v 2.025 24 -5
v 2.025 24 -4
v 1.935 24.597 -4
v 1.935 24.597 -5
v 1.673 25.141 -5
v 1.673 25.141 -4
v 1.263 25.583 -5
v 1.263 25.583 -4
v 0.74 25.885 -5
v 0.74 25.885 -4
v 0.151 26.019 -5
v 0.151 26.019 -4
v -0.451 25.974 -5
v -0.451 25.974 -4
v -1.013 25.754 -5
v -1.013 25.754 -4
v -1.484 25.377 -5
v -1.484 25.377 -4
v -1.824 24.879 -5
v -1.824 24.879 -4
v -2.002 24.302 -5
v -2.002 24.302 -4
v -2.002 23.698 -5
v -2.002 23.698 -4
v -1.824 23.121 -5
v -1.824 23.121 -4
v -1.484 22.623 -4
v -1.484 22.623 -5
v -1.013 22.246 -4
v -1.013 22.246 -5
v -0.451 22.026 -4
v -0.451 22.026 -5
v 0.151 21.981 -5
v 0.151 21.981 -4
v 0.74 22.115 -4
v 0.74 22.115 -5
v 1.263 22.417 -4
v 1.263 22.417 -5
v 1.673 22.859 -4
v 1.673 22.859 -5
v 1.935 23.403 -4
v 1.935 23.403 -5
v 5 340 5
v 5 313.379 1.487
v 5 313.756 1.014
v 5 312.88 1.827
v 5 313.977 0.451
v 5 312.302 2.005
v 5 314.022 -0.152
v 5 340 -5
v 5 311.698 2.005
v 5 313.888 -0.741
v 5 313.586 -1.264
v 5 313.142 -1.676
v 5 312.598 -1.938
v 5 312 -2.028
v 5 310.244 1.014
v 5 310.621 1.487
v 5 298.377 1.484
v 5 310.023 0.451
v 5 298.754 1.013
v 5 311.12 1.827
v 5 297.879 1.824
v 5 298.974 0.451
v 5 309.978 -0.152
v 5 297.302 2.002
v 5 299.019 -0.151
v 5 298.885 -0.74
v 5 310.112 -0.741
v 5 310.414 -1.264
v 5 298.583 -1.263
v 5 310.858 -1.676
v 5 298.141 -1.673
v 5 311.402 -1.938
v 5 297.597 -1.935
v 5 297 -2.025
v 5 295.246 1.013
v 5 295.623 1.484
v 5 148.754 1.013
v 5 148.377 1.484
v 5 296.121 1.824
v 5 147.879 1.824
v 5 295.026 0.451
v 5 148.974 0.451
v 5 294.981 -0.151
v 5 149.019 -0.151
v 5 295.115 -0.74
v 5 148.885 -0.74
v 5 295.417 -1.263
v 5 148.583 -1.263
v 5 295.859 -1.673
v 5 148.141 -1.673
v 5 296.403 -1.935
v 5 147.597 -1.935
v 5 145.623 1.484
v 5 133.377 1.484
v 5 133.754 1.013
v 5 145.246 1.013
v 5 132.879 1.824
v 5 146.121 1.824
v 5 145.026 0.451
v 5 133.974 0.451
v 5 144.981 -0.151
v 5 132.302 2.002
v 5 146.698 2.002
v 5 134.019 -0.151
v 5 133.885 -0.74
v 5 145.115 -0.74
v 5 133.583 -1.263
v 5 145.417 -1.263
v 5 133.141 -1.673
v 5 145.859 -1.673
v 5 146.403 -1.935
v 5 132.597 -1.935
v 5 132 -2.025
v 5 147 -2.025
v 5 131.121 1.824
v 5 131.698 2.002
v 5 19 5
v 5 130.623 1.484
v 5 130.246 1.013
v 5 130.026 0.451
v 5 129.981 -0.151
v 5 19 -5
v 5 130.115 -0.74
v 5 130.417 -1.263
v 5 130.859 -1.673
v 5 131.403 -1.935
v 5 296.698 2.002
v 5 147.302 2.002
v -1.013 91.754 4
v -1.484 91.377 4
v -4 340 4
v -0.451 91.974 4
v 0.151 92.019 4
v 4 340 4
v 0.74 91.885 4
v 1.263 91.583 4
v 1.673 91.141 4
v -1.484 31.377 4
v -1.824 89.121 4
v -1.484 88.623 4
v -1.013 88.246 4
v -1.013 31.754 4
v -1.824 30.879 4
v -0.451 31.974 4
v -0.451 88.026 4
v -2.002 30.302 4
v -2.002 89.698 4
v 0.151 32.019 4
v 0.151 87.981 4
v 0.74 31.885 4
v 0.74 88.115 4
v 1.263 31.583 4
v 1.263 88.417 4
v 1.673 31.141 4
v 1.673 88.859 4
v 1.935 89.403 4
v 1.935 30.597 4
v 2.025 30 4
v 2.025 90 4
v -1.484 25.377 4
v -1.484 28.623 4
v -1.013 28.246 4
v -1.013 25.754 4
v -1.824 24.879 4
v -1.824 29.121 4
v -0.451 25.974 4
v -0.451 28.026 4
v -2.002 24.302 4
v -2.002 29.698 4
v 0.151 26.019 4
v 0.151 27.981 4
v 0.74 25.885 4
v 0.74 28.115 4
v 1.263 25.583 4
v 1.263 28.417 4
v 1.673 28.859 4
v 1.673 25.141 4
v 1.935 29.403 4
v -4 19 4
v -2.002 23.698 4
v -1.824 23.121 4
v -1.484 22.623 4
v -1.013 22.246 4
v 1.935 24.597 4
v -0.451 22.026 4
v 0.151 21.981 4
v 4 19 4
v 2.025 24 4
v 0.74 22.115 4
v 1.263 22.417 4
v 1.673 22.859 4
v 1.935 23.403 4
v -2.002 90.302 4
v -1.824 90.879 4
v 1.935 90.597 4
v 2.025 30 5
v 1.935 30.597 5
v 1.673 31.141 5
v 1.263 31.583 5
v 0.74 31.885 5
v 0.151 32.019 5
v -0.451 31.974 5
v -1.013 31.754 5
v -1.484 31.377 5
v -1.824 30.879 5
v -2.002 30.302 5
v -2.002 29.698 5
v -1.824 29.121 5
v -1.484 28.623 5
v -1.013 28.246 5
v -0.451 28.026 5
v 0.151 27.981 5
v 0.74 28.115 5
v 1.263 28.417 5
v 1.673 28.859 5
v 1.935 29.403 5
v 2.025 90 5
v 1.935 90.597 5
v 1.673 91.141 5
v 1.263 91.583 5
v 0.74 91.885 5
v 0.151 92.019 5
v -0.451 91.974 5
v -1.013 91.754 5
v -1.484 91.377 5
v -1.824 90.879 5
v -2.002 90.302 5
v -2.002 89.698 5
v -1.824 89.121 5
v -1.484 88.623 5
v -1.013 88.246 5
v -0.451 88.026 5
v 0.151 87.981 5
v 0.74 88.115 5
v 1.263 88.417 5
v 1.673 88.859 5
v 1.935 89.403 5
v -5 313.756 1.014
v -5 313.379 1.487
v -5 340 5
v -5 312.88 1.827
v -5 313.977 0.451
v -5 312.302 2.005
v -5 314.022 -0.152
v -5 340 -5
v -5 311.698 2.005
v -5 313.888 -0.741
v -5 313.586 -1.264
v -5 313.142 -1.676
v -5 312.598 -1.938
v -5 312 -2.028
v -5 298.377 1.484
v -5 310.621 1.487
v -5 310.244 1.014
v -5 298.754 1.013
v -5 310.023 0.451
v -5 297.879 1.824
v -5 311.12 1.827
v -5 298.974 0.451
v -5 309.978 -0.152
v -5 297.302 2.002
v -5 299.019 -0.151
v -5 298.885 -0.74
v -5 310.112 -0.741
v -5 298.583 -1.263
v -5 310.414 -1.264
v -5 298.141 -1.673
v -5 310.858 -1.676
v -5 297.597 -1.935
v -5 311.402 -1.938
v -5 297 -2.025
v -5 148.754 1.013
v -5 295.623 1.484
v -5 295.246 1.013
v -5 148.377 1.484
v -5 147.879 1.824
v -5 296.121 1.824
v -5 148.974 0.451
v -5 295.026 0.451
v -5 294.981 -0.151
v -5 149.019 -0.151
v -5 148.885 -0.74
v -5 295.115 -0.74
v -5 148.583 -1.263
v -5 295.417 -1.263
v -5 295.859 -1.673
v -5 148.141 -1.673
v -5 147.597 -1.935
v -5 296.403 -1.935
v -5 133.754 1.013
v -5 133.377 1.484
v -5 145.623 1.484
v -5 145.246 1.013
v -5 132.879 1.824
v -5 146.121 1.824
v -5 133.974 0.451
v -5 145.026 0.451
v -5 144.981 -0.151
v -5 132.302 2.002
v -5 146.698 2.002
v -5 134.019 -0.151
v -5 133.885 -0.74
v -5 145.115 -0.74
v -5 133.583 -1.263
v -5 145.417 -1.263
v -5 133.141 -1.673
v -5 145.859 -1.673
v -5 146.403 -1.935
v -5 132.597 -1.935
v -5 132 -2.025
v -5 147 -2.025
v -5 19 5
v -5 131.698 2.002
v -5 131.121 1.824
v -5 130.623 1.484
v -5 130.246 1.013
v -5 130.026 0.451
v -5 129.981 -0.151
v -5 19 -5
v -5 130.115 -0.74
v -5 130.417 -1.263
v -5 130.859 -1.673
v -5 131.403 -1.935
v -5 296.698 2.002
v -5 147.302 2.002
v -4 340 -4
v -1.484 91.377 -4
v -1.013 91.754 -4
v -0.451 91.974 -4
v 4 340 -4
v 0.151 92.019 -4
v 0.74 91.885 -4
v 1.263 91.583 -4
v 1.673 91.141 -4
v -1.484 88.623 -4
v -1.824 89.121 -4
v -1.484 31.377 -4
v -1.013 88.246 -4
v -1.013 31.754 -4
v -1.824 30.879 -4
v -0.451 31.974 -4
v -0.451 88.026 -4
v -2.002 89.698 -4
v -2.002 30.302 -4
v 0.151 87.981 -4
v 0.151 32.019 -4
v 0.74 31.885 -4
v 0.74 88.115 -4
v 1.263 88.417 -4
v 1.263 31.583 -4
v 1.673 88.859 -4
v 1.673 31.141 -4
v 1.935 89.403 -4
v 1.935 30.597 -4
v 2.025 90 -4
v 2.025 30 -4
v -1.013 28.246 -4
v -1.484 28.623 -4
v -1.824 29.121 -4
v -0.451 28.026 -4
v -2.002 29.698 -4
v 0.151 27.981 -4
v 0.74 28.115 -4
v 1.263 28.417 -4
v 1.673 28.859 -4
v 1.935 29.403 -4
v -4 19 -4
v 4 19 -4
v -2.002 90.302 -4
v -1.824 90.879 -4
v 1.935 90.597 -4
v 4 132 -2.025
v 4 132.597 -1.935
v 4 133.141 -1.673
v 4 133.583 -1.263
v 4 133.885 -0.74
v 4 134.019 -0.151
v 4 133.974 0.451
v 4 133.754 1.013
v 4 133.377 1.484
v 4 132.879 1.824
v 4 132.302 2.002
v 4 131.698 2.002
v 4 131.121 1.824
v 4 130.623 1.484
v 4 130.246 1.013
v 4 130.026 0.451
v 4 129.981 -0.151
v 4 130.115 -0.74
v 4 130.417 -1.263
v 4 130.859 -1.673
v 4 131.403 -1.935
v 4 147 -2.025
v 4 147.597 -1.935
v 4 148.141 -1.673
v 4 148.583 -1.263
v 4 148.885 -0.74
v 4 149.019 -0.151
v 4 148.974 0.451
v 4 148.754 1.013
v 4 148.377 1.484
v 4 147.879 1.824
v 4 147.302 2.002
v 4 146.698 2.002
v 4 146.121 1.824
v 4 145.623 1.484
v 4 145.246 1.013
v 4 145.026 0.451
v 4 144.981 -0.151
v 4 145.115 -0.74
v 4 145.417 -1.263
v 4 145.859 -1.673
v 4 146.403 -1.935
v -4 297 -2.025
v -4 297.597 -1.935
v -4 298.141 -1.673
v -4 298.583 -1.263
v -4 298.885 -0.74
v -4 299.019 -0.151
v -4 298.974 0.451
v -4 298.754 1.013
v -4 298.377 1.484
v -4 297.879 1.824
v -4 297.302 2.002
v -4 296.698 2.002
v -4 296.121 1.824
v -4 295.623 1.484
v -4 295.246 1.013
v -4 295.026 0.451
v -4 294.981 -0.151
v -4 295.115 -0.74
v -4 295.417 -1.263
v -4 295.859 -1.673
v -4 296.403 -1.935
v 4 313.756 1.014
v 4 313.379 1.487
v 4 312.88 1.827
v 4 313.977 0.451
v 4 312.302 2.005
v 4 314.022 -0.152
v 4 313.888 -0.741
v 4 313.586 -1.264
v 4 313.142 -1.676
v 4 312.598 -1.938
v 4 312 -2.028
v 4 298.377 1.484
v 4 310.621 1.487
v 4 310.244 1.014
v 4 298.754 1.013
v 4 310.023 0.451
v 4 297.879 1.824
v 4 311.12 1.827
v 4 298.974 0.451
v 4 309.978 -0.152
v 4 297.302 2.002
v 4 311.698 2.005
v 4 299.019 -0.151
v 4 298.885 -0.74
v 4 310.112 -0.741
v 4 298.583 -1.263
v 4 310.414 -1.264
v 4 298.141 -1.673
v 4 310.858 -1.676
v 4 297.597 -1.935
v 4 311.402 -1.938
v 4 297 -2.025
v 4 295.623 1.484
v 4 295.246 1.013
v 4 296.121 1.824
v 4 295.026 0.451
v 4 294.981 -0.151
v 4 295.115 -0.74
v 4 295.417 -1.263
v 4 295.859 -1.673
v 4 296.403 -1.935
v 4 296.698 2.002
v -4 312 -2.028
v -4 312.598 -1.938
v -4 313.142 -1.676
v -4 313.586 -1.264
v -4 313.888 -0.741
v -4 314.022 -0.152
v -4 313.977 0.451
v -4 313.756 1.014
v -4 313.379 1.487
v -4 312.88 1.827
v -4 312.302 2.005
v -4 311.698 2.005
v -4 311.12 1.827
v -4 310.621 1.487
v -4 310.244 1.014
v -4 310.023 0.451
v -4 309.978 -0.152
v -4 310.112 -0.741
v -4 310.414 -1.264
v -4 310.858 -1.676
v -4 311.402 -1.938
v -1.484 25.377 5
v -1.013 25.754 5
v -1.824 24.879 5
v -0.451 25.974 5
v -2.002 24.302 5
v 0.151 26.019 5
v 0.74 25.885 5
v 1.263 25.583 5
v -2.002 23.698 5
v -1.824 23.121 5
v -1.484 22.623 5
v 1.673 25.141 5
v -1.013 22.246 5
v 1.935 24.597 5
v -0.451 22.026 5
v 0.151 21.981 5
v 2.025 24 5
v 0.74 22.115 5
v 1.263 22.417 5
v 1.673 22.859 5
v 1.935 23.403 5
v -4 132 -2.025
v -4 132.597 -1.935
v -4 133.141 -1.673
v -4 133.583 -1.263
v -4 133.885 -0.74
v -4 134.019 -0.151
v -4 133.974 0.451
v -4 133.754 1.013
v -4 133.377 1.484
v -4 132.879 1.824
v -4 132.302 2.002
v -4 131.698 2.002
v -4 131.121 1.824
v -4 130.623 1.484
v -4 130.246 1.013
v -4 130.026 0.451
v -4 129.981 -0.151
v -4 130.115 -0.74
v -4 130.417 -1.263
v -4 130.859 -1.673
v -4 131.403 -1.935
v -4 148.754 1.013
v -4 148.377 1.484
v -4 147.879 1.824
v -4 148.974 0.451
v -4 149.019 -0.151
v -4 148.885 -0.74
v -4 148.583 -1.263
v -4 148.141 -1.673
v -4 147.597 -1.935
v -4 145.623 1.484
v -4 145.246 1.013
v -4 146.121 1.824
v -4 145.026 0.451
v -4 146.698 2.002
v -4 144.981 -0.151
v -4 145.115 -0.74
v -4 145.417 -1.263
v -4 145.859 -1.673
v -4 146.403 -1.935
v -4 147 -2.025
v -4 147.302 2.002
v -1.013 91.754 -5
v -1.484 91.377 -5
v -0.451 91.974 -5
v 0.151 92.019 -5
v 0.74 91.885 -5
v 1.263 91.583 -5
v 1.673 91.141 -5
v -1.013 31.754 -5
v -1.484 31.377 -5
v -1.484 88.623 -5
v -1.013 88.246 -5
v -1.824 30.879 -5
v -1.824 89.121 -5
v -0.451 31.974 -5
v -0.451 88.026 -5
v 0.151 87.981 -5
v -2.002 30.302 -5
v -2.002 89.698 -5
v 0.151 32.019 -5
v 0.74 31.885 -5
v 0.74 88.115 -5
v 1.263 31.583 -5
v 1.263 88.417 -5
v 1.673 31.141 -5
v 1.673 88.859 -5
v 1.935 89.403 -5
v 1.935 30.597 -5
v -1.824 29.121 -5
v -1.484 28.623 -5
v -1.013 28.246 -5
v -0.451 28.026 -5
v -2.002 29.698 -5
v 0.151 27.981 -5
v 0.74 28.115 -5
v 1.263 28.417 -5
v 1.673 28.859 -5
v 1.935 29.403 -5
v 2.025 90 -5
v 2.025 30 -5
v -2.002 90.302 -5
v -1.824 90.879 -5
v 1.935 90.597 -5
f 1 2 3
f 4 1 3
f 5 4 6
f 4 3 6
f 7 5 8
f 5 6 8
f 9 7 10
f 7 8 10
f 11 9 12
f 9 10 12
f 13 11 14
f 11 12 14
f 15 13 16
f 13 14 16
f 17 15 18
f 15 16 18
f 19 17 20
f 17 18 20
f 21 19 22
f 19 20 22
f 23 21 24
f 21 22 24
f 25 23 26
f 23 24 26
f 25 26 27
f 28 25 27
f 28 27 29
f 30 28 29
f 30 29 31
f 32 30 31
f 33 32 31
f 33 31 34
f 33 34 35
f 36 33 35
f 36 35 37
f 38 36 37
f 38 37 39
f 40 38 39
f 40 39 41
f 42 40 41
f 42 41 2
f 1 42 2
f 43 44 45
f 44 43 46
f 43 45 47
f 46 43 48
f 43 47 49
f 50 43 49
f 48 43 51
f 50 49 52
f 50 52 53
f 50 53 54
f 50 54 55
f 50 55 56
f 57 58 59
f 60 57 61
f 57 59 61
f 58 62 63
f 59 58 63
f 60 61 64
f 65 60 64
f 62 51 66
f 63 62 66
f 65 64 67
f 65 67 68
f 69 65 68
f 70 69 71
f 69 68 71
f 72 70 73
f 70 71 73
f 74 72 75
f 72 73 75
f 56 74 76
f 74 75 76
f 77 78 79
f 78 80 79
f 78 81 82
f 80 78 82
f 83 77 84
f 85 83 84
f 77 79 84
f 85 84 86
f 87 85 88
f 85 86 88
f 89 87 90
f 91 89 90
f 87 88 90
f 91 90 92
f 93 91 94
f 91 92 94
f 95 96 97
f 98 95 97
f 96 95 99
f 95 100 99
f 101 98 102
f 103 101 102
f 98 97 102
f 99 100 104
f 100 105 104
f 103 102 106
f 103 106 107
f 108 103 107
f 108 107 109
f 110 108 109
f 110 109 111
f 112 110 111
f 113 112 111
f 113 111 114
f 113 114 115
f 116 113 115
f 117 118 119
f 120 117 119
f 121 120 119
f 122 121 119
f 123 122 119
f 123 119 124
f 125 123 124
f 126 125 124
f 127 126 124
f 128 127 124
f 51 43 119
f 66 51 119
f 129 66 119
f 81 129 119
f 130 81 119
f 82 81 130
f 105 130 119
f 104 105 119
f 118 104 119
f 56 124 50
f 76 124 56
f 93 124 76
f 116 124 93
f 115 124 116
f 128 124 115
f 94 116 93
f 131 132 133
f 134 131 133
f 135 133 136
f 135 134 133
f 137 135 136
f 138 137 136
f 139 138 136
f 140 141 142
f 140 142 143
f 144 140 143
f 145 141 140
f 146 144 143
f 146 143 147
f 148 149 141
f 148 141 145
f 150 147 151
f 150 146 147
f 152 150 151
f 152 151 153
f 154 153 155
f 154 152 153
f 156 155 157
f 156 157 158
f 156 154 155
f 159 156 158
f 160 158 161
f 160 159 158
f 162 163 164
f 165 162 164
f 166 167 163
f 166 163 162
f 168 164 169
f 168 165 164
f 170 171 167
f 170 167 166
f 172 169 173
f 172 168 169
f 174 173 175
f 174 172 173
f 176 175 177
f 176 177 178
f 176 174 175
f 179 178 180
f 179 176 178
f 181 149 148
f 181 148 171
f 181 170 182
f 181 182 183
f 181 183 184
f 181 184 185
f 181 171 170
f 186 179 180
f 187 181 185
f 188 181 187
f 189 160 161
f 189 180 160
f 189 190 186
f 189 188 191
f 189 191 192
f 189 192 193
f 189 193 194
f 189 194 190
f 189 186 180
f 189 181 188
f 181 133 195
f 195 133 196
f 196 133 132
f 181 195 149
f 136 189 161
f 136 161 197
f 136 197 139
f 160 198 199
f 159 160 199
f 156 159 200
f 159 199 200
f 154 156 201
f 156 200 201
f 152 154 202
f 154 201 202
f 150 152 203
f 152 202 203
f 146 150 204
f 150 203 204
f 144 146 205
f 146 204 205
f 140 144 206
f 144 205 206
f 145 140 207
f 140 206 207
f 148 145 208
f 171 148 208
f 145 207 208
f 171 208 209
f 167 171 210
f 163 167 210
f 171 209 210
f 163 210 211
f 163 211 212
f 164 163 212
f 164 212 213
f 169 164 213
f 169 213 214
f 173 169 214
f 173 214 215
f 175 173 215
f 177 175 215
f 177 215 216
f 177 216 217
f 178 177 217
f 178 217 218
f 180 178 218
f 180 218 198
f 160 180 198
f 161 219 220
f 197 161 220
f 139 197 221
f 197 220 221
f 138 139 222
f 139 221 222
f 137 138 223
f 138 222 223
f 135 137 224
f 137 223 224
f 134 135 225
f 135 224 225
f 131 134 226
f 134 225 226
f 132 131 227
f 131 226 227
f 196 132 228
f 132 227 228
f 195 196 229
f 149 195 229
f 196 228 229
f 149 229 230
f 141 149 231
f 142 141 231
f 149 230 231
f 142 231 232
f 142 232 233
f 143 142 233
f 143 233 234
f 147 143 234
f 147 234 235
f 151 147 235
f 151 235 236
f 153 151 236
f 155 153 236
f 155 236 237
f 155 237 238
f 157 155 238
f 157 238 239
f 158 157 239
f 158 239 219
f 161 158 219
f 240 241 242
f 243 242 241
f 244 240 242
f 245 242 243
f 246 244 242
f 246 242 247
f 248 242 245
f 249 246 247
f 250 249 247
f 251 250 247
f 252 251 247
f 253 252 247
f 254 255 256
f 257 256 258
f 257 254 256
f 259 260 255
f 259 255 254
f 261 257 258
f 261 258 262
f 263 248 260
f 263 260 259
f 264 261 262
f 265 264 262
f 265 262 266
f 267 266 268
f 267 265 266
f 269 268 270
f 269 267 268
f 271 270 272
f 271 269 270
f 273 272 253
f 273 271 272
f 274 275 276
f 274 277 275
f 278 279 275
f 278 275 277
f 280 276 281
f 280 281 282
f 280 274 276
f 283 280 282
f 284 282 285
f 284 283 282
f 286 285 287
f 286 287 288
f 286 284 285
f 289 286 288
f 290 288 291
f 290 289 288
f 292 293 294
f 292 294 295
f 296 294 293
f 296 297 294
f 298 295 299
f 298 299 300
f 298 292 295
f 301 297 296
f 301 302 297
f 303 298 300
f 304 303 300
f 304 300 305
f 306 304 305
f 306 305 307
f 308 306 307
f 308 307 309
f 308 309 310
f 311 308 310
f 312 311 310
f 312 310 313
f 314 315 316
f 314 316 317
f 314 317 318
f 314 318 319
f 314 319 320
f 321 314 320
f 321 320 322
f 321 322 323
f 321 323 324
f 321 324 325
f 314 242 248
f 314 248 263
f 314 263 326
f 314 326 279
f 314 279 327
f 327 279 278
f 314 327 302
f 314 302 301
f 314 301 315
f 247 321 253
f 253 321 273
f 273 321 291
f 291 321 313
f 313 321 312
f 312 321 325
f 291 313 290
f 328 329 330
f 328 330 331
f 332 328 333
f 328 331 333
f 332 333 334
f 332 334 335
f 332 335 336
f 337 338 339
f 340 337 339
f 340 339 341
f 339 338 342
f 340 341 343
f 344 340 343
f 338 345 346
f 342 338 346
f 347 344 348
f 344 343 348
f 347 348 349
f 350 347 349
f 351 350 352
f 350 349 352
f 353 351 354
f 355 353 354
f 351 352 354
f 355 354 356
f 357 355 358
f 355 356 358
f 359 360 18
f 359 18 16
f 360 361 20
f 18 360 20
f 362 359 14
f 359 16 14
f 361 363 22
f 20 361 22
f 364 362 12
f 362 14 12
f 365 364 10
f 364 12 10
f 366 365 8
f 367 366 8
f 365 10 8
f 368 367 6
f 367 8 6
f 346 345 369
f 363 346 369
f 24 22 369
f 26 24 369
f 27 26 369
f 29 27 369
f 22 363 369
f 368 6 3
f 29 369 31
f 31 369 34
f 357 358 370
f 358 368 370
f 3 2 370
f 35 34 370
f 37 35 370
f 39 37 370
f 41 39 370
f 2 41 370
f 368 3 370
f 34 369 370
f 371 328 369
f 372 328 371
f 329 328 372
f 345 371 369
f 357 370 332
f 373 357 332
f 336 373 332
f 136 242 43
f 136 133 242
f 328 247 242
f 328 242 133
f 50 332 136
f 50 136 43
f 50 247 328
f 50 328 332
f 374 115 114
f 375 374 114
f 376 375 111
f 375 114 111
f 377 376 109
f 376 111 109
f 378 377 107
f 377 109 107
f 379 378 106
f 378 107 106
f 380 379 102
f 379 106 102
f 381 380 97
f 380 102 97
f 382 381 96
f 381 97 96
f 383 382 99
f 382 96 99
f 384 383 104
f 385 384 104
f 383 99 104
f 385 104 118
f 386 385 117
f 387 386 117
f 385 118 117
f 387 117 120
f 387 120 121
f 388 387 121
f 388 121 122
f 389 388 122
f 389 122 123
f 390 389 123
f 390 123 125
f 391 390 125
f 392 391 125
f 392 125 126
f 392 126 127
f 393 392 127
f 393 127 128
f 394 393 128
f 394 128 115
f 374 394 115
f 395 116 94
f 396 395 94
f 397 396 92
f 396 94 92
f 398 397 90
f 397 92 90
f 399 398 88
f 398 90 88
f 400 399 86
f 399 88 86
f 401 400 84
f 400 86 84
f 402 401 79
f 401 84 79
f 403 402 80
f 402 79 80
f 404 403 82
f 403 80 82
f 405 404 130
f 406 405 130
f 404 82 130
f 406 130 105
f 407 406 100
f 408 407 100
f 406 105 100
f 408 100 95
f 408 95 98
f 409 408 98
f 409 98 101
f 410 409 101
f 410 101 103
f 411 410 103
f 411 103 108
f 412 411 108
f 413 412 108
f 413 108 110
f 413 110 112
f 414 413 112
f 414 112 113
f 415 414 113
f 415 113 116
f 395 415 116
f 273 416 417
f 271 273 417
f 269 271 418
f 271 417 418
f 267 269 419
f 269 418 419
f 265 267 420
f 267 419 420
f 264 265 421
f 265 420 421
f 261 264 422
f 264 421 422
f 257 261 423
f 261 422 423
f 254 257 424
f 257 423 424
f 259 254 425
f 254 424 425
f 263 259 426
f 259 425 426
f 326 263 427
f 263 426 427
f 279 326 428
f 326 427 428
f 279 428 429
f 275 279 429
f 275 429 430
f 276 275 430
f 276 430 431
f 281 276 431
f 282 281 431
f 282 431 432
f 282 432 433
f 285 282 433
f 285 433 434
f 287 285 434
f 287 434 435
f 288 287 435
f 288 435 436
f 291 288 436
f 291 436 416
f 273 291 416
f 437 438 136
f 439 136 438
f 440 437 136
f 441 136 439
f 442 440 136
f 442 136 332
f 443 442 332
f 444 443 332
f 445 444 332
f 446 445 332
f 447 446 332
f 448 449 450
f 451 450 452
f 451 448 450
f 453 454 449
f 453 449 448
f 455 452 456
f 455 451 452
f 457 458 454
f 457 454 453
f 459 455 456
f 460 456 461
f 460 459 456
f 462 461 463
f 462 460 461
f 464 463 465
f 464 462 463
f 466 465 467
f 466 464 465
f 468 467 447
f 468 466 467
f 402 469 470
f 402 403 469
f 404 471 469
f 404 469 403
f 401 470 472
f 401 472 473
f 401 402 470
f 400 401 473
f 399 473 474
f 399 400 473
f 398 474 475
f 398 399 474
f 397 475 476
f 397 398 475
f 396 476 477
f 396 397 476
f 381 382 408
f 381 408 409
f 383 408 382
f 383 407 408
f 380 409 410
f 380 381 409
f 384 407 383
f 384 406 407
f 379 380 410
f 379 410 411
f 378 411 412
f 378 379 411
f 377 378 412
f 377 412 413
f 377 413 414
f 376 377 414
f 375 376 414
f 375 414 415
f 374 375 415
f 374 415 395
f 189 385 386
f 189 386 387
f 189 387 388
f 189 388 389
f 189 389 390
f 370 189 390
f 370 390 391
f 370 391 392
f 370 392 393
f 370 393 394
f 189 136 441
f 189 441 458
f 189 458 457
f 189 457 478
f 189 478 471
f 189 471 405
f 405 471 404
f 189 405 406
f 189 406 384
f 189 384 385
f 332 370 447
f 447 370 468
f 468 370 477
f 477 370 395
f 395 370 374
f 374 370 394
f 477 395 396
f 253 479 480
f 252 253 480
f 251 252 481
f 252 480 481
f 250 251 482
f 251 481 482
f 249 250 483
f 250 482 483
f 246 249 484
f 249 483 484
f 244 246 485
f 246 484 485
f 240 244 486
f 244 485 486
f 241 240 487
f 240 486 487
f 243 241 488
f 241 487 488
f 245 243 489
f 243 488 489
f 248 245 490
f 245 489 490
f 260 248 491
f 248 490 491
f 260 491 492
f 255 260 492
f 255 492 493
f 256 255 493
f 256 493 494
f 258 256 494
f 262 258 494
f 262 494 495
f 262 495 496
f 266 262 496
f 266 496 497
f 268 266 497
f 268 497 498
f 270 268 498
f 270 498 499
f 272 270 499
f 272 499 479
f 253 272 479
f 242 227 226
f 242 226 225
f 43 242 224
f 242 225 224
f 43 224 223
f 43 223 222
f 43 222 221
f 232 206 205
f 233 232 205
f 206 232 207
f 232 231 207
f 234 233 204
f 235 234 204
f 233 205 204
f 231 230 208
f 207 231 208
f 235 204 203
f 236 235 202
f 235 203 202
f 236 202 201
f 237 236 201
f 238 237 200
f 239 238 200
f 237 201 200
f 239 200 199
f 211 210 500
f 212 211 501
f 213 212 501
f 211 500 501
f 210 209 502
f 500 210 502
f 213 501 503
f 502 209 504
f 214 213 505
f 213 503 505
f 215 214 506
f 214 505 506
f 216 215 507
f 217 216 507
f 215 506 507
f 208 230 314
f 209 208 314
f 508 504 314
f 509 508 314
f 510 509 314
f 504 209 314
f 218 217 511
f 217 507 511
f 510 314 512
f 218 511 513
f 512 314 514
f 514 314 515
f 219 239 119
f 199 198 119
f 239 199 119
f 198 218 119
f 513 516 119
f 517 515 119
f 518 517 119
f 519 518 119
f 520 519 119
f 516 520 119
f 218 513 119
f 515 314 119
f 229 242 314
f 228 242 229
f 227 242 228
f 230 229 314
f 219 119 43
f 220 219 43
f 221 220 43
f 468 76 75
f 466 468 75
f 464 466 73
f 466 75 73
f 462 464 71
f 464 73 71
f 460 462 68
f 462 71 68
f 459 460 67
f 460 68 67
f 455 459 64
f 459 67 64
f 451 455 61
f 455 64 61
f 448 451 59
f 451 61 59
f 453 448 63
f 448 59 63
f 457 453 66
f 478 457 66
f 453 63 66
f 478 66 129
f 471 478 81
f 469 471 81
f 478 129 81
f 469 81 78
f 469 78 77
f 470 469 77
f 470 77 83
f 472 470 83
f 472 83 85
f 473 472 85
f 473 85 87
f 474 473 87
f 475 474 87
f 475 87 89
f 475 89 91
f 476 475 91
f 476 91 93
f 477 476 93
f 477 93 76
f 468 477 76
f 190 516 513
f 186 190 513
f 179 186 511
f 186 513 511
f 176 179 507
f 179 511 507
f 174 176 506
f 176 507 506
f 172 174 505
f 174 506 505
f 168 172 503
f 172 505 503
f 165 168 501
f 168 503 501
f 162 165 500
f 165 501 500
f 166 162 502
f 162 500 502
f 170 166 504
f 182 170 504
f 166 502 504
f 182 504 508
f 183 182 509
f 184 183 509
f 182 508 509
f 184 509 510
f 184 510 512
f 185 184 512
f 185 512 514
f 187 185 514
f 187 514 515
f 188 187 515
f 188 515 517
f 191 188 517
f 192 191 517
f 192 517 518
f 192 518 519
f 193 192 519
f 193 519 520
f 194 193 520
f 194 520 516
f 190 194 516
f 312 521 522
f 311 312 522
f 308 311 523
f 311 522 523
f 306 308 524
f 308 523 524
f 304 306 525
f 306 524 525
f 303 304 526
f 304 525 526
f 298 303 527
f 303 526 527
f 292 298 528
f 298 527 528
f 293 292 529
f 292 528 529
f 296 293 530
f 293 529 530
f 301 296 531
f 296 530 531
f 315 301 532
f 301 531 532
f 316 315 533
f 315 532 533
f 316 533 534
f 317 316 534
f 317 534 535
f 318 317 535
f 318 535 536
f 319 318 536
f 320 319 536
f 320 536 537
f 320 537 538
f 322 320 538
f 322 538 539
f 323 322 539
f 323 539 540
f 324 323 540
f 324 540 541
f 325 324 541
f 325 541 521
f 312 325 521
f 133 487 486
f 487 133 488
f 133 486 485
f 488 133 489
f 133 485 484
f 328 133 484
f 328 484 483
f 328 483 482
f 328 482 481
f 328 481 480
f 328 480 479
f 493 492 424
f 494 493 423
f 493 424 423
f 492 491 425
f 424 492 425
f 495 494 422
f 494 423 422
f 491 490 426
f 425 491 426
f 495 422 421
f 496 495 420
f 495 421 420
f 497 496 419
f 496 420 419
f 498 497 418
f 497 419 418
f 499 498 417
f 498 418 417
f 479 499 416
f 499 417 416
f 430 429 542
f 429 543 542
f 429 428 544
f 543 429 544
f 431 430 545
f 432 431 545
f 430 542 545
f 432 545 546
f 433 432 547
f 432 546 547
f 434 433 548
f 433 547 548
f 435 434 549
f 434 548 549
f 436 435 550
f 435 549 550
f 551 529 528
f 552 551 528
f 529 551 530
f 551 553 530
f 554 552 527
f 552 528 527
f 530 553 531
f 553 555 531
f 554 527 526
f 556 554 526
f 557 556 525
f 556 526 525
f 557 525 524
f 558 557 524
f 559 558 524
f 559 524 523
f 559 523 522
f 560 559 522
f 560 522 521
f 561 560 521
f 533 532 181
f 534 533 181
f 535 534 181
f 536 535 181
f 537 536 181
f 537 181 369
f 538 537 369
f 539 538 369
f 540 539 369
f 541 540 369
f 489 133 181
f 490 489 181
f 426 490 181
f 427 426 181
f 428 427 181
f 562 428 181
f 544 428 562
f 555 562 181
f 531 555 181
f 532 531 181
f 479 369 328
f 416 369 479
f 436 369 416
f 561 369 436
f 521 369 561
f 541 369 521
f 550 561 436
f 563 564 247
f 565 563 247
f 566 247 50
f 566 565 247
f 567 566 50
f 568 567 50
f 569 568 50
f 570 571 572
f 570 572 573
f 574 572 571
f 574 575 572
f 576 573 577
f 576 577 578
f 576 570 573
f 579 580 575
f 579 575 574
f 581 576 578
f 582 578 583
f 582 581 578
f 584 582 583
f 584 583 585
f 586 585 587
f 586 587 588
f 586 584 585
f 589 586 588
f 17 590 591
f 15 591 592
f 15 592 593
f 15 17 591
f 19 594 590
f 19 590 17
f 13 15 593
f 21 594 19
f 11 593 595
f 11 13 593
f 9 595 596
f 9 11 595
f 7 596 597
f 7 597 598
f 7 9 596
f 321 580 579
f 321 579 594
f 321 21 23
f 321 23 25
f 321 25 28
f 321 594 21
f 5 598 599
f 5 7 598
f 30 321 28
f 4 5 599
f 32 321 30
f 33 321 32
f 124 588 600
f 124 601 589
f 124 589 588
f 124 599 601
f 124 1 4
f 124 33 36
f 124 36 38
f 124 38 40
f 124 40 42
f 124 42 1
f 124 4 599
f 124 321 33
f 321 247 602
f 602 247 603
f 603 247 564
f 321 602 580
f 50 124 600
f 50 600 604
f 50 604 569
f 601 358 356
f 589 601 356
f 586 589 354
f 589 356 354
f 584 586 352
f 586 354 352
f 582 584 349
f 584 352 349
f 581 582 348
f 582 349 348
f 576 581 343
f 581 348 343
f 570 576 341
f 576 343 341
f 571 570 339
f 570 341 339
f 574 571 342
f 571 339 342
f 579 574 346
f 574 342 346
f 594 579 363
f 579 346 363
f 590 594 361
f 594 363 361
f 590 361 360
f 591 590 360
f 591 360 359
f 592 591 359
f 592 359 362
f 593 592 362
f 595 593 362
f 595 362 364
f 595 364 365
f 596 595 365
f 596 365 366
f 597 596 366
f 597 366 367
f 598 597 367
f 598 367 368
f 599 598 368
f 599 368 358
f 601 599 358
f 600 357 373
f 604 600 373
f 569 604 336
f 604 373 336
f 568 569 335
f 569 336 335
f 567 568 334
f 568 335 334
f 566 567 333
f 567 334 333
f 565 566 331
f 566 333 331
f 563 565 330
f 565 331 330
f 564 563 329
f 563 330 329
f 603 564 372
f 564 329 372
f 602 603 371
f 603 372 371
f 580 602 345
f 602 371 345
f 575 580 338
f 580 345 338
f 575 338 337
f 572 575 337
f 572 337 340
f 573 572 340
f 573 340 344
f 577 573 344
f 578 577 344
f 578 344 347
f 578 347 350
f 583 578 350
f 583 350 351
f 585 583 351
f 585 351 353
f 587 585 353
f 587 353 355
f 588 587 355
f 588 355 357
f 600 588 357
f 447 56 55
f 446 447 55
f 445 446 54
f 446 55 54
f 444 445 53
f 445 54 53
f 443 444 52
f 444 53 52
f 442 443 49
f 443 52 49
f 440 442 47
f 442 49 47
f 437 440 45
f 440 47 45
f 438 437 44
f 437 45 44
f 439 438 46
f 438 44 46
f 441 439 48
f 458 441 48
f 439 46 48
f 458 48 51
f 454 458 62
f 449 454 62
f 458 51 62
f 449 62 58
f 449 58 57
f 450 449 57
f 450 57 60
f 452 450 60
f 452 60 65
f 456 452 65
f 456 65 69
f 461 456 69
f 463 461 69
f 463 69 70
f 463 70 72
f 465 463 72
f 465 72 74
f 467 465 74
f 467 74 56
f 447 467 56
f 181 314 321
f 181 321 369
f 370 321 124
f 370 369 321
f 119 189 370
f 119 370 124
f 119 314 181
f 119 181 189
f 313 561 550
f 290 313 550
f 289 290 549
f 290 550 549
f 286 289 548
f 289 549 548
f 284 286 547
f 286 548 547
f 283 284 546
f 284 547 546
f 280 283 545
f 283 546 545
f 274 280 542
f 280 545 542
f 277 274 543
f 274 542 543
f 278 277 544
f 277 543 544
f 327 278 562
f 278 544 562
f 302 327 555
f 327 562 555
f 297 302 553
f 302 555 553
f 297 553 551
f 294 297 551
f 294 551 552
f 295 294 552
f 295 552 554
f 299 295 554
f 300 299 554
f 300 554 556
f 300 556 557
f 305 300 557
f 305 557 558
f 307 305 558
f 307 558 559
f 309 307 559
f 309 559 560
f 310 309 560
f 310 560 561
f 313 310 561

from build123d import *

# Parameters (mm, degrees)
SKETCH1_W           = 10
SKETCH1_H           = 10
SKETCH1_W_2         = 8
SKETCH1_H_2         = 8
BOSS_EXTRUDE1_DEPTH = 340
SKETCH2_R           = 2.025
CUT_EXTRUDE1_DEPTH  = 341.183773863
SKETCH3_R           = 2.028
SKETCH3_R_2         = 2.025
CUT_EXTRUDE2_DEPTH  = 341.183773863
SKETCH4_W           = 10
SKETCH4_H           = 19
CUT_EXTRUDE3_DEPTH  = 341.183773863


with BuildPart() as part:
    # Sketch1 → Boss-Extrude1 (new body)
    with BuildSketch(Plane(origin=(0, 0, 0), x_dir=(1, 0, 0), z_dir=(0, 1, 0))):
        Rectangle(SKETCH1_W, SKETCH1_H)
        Rectangle(SKETCH1_W_2, SKETCH1_H_2, mode=Mode.SUBTRACT)
    extrude(amount=BOSS_EXTRUDE1_DEPTH)

    # Sketch2 → Cut-Extrude1 (cut, through all)
    with BuildSketch(Plane.XY.offset(5)):
        with Locations((0, 90)):
            Circle(SKETCH2_R)
        with Locations((0, 30)):
            Circle(SKETCH2_R)
        with Locations((0, 24)):
            Circle(SKETCH2_R)
    extrude(amount=-CUT_EXTRUDE1_DEPTH, mode=Mode.SUBTRACT)

    # Sketch3 → Cut-Extrude2 (cut, through all)
    with BuildSketch(Plane(origin=(5, 0, 0), x_dir=(0, 0, -1), z_dir=(1, 0, 0))):
        with Locations((0, 312)):
            Circle(SKETCH3_R)
        with Locations((0, 297)):
            Circle(SKETCH3_R_2)
        with Locations((0, 147)):
            Circle(SKETCH3_R_2)
        with Locations((0, 132)):
            Circle(SKETCH3_R_2)
    extrude(amount=-CUT_EXTRUDE2_DEPTH, mode=Mode.SUBTRACT)

    # Sketch4 → Cut-Extrude3 (cut, through all)
    with BuildSketch(Plane.XY.offset(5)):
        with Locations((0, 9.5)):
            Rectangle(SKETCH4_W, SKETCH4_H)
    extrude(amount=-CUT_EXTRUDE3_DEPTH, mode=Mode.SUBTRACT)


solid = part.part
